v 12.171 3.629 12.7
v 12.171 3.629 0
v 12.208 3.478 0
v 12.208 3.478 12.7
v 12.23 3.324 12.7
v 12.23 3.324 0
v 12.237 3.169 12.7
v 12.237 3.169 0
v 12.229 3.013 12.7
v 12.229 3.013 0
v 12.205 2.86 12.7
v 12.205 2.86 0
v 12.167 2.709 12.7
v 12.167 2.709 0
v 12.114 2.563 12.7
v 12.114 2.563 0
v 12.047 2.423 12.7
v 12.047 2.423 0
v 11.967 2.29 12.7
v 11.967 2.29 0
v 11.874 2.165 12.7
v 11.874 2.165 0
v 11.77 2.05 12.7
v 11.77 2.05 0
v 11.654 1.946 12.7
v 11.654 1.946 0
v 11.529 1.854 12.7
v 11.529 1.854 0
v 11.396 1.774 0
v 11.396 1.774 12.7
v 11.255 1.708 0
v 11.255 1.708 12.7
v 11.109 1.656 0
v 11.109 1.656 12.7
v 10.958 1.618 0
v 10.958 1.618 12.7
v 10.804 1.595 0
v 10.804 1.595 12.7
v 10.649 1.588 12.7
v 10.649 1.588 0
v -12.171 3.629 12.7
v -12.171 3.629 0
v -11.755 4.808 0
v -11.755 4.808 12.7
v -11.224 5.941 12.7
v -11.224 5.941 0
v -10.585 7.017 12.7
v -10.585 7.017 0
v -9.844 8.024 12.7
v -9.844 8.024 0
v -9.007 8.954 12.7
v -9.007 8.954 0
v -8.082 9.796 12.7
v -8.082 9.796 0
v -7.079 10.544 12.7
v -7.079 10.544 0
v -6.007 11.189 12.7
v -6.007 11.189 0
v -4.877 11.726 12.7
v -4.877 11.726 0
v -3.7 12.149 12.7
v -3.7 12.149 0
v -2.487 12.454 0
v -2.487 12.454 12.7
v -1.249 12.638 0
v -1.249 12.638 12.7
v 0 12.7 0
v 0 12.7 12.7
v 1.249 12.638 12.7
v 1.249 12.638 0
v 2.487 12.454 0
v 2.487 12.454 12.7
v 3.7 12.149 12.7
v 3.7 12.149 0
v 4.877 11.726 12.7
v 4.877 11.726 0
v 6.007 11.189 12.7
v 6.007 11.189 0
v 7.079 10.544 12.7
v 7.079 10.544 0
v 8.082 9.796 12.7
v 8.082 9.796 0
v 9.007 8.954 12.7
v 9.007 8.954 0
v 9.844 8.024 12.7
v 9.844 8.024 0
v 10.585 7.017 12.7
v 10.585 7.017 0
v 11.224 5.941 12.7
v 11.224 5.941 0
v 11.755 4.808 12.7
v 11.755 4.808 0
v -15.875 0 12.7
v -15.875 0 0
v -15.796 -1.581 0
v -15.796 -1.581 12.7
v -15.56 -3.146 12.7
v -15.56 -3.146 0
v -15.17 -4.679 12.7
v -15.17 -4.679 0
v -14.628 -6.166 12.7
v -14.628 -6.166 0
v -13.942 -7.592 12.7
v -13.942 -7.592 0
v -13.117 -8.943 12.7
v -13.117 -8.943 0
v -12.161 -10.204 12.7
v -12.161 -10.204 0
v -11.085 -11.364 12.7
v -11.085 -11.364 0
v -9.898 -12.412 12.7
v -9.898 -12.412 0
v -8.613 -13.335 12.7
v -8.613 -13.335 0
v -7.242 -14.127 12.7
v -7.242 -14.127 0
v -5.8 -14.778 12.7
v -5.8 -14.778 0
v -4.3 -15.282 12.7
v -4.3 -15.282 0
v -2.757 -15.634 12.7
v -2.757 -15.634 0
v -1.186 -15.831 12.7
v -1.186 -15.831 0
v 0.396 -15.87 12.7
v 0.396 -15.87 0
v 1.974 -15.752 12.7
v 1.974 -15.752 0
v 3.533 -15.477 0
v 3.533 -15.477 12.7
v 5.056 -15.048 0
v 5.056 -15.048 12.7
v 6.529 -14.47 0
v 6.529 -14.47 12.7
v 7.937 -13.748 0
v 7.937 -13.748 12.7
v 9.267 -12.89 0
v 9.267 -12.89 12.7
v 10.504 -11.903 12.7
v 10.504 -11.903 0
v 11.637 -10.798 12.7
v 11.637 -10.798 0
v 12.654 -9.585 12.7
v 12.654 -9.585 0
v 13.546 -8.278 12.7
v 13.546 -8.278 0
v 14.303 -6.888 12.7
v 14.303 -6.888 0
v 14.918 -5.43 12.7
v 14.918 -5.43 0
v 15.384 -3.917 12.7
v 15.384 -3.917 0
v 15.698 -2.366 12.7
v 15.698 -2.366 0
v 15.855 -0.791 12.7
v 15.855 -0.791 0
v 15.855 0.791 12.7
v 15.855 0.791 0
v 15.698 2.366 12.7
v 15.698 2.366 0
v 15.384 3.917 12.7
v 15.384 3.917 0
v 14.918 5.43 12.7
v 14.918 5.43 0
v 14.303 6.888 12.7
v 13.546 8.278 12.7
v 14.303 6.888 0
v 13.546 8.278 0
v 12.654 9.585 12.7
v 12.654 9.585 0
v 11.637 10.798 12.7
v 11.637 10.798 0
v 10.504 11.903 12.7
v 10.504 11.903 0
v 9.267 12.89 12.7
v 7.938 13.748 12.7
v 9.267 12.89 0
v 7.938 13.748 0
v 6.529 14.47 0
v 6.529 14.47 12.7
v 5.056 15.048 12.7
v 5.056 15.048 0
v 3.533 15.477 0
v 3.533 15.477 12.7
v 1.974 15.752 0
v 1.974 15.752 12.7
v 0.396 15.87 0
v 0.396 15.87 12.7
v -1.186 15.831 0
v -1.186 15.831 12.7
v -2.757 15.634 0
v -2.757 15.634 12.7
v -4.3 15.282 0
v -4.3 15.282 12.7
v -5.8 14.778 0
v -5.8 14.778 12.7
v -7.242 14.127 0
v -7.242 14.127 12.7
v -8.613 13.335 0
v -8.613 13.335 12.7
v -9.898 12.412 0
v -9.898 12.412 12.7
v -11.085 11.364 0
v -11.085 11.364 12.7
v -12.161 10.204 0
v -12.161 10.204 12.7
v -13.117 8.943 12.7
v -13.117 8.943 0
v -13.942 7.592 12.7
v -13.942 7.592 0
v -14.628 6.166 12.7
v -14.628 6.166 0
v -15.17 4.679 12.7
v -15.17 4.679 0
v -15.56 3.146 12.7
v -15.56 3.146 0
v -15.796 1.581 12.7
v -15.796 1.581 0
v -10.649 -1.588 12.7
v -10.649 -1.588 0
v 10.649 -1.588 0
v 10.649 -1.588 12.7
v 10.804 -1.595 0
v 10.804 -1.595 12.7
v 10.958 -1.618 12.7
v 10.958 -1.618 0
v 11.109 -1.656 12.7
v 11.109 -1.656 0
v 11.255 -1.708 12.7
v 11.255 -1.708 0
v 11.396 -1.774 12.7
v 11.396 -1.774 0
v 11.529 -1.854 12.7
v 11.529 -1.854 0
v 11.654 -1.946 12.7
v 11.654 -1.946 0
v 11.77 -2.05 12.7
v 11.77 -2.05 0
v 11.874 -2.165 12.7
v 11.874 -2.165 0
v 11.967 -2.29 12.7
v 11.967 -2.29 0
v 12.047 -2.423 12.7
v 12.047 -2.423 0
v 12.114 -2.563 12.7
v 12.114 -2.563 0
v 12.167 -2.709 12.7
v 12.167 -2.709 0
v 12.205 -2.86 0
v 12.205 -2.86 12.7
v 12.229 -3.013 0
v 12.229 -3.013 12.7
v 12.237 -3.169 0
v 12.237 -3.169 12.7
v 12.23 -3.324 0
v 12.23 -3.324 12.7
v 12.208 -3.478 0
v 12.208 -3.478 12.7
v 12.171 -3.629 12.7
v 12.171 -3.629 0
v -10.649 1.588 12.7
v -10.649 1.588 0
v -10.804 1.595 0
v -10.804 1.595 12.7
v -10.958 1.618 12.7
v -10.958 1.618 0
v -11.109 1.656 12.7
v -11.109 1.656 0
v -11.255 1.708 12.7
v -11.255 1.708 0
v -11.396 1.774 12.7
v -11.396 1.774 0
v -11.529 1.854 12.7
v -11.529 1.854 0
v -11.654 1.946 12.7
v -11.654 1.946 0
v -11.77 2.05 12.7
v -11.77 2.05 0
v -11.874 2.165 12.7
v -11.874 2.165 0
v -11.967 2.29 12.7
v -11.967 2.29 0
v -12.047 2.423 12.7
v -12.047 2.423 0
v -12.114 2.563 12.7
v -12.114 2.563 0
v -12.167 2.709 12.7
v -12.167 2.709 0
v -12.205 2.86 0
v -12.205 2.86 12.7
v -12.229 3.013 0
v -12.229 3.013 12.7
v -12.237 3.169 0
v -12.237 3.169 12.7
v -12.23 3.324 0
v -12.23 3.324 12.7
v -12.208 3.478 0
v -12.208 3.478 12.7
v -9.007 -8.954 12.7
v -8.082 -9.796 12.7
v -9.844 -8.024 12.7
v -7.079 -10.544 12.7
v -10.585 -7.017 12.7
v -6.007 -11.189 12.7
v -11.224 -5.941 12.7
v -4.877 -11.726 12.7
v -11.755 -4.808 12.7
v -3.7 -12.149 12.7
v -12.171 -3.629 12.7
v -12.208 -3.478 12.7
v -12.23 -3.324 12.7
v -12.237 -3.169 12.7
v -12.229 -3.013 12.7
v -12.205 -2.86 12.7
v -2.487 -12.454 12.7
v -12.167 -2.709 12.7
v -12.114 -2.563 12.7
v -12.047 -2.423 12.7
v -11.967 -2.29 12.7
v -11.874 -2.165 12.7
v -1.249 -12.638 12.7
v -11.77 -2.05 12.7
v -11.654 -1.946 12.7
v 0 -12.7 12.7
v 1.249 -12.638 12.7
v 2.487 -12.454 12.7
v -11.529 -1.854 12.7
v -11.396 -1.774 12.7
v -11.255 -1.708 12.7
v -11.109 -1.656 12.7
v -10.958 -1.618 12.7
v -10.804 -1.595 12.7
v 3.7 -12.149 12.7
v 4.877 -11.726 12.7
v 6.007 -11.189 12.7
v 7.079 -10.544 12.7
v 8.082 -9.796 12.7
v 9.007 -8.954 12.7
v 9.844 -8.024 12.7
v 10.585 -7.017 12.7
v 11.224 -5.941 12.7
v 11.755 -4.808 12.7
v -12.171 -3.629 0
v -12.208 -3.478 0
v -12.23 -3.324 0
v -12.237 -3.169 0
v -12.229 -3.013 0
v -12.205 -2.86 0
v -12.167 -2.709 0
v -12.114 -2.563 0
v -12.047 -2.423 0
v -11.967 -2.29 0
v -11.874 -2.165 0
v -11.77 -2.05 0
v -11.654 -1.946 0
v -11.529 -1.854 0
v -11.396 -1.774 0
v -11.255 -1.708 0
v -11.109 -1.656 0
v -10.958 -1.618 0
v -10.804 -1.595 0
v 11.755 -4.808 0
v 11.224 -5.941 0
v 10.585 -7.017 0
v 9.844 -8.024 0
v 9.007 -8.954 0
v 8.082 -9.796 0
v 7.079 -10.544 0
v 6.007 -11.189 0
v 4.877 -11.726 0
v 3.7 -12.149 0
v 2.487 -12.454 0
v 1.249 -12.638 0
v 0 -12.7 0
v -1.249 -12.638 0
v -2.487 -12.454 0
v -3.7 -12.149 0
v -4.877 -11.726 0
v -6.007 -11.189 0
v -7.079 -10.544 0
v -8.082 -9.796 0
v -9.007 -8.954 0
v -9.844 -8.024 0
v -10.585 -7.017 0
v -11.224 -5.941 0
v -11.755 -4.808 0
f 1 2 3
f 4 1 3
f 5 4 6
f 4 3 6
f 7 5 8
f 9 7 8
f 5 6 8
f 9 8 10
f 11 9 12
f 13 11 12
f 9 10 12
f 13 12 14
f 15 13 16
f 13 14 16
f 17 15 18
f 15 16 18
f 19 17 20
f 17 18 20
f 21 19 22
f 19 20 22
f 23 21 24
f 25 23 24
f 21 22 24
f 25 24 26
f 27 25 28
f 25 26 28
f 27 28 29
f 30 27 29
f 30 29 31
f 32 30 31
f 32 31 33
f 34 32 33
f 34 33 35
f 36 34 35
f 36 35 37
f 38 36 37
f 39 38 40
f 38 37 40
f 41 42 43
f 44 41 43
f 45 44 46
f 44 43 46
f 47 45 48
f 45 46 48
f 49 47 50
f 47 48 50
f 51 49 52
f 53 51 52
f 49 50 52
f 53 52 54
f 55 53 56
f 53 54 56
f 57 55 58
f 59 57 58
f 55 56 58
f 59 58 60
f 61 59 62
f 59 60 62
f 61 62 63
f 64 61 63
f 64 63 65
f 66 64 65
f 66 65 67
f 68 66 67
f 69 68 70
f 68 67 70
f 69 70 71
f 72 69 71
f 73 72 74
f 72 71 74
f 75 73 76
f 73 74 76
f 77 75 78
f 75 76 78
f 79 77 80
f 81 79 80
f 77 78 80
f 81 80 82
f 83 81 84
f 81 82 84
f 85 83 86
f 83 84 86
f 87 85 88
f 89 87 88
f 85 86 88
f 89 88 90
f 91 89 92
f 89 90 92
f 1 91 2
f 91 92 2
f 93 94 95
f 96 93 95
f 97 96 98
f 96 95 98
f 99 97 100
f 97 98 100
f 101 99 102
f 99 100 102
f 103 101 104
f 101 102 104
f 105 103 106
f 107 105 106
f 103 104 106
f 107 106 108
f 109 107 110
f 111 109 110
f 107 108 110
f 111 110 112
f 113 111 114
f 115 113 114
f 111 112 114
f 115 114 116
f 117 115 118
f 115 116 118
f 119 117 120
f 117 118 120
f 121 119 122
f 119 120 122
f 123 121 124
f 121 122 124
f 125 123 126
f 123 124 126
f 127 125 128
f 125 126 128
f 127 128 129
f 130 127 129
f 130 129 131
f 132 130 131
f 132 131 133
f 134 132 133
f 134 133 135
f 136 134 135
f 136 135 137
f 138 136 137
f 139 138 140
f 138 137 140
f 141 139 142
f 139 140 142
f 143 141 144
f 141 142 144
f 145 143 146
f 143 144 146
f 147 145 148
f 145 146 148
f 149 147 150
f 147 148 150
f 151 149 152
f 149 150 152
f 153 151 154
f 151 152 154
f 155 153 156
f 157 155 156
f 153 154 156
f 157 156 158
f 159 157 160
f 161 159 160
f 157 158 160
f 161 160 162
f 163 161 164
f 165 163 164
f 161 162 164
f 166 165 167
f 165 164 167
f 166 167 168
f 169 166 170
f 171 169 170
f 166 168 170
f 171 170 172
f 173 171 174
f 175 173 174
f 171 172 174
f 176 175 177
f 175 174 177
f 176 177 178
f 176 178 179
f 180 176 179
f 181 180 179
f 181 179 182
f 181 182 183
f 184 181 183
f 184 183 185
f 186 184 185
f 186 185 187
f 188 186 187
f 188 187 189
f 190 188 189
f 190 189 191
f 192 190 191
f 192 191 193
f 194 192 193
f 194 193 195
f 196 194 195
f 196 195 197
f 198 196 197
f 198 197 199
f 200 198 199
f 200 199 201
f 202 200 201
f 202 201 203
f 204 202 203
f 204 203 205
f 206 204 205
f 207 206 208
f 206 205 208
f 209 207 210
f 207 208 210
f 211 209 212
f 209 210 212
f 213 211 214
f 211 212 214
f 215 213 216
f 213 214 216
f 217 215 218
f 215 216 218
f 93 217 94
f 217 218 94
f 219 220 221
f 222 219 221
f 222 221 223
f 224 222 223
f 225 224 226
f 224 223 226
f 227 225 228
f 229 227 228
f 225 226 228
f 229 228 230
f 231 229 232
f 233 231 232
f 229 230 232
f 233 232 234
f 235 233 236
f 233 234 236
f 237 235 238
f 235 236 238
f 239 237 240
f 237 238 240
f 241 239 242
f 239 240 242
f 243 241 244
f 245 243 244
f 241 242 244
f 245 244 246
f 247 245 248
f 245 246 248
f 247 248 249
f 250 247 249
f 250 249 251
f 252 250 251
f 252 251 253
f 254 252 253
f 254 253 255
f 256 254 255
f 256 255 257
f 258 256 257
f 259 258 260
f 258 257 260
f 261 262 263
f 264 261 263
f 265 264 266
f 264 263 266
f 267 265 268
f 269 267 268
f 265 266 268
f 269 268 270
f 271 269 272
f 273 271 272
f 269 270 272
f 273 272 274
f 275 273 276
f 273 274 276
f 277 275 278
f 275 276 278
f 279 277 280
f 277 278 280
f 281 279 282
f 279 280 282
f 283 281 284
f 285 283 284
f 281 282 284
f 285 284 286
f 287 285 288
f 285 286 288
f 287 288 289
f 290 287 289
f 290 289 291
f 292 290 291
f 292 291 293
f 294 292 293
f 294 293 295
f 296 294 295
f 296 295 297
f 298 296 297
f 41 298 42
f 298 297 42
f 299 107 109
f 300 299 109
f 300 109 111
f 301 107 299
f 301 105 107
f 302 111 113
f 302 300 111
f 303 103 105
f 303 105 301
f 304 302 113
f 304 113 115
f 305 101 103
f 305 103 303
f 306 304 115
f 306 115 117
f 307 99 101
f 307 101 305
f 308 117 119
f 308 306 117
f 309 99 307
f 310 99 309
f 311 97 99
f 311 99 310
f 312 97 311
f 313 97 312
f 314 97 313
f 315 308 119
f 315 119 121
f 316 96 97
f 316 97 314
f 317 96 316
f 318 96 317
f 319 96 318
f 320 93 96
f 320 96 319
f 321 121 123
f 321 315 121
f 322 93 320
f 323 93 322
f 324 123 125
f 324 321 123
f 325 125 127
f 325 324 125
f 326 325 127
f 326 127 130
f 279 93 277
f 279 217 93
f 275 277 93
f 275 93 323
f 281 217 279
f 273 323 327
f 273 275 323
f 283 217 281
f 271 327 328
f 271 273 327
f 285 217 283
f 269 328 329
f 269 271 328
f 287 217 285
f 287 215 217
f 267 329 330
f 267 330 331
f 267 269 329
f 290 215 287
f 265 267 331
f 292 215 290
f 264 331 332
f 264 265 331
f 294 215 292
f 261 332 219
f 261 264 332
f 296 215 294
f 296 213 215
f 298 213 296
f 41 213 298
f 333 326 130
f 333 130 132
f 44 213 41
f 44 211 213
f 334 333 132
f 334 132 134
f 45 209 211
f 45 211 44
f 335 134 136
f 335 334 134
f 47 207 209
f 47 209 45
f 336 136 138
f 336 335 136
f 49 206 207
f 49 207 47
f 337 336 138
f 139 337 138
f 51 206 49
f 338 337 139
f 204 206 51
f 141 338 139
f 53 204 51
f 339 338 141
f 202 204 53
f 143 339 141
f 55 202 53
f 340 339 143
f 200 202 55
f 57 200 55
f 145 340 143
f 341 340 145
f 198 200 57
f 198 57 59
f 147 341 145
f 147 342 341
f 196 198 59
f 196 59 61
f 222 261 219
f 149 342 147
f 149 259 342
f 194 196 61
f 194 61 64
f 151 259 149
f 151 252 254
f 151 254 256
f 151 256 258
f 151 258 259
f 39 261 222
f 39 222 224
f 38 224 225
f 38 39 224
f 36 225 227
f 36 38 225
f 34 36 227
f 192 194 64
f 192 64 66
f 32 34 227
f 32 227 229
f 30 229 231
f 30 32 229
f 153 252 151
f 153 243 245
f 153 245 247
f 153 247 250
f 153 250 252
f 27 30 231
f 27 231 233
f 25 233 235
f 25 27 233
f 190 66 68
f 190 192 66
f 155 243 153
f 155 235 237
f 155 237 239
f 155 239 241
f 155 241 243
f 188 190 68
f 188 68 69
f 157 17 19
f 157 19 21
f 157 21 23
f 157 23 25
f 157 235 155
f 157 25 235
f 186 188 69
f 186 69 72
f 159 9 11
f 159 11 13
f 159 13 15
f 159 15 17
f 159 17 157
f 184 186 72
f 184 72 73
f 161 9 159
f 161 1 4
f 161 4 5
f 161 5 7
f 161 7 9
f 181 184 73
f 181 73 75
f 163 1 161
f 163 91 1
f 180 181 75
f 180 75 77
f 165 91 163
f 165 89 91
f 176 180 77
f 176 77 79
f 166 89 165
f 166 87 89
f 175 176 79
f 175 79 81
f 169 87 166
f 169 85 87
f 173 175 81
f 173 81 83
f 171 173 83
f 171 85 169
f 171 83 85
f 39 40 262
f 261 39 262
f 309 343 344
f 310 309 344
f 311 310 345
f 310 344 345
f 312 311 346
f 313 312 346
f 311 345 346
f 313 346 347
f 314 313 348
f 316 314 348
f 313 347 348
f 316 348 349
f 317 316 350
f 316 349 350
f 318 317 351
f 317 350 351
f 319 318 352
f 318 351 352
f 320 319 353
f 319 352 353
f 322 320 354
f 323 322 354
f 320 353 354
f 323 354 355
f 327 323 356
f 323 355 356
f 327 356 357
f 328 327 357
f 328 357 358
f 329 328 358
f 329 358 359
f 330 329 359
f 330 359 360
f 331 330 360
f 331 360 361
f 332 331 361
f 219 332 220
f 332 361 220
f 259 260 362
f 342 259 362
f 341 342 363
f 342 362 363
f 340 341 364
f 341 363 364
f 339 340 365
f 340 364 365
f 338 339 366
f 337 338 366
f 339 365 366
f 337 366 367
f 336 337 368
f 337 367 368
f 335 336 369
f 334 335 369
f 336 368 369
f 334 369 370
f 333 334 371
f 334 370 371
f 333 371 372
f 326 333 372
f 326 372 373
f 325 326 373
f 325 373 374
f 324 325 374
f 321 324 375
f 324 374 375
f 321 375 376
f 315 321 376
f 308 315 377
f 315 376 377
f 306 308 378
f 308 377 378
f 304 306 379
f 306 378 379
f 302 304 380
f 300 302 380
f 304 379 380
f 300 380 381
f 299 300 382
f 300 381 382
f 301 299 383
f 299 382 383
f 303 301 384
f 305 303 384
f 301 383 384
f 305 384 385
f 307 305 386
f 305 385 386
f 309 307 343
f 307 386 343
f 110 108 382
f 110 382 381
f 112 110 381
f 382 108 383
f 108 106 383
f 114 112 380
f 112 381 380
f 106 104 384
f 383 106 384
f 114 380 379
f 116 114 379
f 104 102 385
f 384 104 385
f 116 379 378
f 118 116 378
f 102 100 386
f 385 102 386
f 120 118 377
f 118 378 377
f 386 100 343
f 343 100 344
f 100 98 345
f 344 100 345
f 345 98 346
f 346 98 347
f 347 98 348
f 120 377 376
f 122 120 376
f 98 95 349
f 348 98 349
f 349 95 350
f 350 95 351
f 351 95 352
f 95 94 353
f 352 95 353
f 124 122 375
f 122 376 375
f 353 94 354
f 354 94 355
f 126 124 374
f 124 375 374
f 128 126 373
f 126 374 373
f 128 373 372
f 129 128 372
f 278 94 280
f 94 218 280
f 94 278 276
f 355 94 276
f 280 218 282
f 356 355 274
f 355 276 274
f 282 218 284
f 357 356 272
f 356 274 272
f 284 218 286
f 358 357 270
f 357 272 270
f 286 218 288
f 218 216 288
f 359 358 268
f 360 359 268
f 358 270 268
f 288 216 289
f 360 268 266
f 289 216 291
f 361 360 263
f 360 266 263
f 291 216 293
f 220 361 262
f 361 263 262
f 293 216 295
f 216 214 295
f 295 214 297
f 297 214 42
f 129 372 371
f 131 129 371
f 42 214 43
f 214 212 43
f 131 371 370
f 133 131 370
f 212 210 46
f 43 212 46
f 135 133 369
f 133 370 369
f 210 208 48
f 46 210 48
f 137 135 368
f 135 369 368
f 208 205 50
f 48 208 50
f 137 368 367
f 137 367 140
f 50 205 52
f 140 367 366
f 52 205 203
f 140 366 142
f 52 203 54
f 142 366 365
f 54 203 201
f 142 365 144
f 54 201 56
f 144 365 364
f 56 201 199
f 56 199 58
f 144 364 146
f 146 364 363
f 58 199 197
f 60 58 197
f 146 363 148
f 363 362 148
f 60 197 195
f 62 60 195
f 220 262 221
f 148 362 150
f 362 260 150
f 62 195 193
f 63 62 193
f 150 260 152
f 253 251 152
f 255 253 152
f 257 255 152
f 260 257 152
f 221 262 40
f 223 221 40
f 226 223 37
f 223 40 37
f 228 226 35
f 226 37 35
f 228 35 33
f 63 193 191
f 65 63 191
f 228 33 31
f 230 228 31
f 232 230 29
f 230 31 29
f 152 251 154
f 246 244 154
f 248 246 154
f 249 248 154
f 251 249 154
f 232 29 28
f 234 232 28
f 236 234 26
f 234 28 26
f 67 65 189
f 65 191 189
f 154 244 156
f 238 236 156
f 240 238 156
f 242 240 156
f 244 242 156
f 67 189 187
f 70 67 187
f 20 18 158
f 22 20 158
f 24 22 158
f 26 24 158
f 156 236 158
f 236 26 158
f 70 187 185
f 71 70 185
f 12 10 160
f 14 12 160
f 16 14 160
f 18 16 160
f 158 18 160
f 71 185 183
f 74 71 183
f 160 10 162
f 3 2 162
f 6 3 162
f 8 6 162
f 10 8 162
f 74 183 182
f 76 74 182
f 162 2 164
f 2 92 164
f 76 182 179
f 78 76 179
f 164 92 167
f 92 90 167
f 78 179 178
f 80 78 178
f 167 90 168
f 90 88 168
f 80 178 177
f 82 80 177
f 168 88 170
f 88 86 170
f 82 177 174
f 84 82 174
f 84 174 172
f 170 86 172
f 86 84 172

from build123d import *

# Parameters (mm, degrees)
F1_DEPTH = 12.7


with BuildPart() as f1:
    # F0 (on Top) → F1 (new body)
    with BuildSketch(Plane.XY):
        with BuildLine():
            Line((-15.875, 0), (15.875, 0))
            ThreePointArc((15.875, 0), (0, 15.875), (-15.875, 0))
        make_face()
        with BuildLine():
            Line((10.649274, 1.5875), (-10.649274, 1.5875))
            ThreePointArc((-10.649274, 1.5875), (-11.922105, 2.226287), (-12.170599, 3.628571))
            ThreePointArc((-12.170599, 3.628571), (0, 12.7), (12.170599, 3.628571))
            ThreePointArc((12.170599, 3.628571), (11.922105, 2.226287), (10.649274, 1.5875))
        make_face(mode=Mode.SUBTRACT)
        with BuildLine():
            ThreePointArc((-15.875, 0), (0, -15.875), (15.875, 0))
            Line((15.875, 0), (-15.875, 0))
        make_face()
        with BuildLine():
            ThreePointArc((12.170599, -3.628571), (0, -12.7), (-12.170599, -3.628571))
            ThreePointArc((-12.170599, -3.628571), (-11.922105, -2.226287), (-10.649274, -1.5875))
            Line((-10.649274, -1.5875), (10.649274, -1.5875))
            ThreePointArc((10.649274, -1.5875), (11.922105, -2.226287), (12.170599, -3.628571))
        make_face(mode=Mode.SUBTRACT)
    extrude(amount=F1_DEPTH)


solid = f1.part
